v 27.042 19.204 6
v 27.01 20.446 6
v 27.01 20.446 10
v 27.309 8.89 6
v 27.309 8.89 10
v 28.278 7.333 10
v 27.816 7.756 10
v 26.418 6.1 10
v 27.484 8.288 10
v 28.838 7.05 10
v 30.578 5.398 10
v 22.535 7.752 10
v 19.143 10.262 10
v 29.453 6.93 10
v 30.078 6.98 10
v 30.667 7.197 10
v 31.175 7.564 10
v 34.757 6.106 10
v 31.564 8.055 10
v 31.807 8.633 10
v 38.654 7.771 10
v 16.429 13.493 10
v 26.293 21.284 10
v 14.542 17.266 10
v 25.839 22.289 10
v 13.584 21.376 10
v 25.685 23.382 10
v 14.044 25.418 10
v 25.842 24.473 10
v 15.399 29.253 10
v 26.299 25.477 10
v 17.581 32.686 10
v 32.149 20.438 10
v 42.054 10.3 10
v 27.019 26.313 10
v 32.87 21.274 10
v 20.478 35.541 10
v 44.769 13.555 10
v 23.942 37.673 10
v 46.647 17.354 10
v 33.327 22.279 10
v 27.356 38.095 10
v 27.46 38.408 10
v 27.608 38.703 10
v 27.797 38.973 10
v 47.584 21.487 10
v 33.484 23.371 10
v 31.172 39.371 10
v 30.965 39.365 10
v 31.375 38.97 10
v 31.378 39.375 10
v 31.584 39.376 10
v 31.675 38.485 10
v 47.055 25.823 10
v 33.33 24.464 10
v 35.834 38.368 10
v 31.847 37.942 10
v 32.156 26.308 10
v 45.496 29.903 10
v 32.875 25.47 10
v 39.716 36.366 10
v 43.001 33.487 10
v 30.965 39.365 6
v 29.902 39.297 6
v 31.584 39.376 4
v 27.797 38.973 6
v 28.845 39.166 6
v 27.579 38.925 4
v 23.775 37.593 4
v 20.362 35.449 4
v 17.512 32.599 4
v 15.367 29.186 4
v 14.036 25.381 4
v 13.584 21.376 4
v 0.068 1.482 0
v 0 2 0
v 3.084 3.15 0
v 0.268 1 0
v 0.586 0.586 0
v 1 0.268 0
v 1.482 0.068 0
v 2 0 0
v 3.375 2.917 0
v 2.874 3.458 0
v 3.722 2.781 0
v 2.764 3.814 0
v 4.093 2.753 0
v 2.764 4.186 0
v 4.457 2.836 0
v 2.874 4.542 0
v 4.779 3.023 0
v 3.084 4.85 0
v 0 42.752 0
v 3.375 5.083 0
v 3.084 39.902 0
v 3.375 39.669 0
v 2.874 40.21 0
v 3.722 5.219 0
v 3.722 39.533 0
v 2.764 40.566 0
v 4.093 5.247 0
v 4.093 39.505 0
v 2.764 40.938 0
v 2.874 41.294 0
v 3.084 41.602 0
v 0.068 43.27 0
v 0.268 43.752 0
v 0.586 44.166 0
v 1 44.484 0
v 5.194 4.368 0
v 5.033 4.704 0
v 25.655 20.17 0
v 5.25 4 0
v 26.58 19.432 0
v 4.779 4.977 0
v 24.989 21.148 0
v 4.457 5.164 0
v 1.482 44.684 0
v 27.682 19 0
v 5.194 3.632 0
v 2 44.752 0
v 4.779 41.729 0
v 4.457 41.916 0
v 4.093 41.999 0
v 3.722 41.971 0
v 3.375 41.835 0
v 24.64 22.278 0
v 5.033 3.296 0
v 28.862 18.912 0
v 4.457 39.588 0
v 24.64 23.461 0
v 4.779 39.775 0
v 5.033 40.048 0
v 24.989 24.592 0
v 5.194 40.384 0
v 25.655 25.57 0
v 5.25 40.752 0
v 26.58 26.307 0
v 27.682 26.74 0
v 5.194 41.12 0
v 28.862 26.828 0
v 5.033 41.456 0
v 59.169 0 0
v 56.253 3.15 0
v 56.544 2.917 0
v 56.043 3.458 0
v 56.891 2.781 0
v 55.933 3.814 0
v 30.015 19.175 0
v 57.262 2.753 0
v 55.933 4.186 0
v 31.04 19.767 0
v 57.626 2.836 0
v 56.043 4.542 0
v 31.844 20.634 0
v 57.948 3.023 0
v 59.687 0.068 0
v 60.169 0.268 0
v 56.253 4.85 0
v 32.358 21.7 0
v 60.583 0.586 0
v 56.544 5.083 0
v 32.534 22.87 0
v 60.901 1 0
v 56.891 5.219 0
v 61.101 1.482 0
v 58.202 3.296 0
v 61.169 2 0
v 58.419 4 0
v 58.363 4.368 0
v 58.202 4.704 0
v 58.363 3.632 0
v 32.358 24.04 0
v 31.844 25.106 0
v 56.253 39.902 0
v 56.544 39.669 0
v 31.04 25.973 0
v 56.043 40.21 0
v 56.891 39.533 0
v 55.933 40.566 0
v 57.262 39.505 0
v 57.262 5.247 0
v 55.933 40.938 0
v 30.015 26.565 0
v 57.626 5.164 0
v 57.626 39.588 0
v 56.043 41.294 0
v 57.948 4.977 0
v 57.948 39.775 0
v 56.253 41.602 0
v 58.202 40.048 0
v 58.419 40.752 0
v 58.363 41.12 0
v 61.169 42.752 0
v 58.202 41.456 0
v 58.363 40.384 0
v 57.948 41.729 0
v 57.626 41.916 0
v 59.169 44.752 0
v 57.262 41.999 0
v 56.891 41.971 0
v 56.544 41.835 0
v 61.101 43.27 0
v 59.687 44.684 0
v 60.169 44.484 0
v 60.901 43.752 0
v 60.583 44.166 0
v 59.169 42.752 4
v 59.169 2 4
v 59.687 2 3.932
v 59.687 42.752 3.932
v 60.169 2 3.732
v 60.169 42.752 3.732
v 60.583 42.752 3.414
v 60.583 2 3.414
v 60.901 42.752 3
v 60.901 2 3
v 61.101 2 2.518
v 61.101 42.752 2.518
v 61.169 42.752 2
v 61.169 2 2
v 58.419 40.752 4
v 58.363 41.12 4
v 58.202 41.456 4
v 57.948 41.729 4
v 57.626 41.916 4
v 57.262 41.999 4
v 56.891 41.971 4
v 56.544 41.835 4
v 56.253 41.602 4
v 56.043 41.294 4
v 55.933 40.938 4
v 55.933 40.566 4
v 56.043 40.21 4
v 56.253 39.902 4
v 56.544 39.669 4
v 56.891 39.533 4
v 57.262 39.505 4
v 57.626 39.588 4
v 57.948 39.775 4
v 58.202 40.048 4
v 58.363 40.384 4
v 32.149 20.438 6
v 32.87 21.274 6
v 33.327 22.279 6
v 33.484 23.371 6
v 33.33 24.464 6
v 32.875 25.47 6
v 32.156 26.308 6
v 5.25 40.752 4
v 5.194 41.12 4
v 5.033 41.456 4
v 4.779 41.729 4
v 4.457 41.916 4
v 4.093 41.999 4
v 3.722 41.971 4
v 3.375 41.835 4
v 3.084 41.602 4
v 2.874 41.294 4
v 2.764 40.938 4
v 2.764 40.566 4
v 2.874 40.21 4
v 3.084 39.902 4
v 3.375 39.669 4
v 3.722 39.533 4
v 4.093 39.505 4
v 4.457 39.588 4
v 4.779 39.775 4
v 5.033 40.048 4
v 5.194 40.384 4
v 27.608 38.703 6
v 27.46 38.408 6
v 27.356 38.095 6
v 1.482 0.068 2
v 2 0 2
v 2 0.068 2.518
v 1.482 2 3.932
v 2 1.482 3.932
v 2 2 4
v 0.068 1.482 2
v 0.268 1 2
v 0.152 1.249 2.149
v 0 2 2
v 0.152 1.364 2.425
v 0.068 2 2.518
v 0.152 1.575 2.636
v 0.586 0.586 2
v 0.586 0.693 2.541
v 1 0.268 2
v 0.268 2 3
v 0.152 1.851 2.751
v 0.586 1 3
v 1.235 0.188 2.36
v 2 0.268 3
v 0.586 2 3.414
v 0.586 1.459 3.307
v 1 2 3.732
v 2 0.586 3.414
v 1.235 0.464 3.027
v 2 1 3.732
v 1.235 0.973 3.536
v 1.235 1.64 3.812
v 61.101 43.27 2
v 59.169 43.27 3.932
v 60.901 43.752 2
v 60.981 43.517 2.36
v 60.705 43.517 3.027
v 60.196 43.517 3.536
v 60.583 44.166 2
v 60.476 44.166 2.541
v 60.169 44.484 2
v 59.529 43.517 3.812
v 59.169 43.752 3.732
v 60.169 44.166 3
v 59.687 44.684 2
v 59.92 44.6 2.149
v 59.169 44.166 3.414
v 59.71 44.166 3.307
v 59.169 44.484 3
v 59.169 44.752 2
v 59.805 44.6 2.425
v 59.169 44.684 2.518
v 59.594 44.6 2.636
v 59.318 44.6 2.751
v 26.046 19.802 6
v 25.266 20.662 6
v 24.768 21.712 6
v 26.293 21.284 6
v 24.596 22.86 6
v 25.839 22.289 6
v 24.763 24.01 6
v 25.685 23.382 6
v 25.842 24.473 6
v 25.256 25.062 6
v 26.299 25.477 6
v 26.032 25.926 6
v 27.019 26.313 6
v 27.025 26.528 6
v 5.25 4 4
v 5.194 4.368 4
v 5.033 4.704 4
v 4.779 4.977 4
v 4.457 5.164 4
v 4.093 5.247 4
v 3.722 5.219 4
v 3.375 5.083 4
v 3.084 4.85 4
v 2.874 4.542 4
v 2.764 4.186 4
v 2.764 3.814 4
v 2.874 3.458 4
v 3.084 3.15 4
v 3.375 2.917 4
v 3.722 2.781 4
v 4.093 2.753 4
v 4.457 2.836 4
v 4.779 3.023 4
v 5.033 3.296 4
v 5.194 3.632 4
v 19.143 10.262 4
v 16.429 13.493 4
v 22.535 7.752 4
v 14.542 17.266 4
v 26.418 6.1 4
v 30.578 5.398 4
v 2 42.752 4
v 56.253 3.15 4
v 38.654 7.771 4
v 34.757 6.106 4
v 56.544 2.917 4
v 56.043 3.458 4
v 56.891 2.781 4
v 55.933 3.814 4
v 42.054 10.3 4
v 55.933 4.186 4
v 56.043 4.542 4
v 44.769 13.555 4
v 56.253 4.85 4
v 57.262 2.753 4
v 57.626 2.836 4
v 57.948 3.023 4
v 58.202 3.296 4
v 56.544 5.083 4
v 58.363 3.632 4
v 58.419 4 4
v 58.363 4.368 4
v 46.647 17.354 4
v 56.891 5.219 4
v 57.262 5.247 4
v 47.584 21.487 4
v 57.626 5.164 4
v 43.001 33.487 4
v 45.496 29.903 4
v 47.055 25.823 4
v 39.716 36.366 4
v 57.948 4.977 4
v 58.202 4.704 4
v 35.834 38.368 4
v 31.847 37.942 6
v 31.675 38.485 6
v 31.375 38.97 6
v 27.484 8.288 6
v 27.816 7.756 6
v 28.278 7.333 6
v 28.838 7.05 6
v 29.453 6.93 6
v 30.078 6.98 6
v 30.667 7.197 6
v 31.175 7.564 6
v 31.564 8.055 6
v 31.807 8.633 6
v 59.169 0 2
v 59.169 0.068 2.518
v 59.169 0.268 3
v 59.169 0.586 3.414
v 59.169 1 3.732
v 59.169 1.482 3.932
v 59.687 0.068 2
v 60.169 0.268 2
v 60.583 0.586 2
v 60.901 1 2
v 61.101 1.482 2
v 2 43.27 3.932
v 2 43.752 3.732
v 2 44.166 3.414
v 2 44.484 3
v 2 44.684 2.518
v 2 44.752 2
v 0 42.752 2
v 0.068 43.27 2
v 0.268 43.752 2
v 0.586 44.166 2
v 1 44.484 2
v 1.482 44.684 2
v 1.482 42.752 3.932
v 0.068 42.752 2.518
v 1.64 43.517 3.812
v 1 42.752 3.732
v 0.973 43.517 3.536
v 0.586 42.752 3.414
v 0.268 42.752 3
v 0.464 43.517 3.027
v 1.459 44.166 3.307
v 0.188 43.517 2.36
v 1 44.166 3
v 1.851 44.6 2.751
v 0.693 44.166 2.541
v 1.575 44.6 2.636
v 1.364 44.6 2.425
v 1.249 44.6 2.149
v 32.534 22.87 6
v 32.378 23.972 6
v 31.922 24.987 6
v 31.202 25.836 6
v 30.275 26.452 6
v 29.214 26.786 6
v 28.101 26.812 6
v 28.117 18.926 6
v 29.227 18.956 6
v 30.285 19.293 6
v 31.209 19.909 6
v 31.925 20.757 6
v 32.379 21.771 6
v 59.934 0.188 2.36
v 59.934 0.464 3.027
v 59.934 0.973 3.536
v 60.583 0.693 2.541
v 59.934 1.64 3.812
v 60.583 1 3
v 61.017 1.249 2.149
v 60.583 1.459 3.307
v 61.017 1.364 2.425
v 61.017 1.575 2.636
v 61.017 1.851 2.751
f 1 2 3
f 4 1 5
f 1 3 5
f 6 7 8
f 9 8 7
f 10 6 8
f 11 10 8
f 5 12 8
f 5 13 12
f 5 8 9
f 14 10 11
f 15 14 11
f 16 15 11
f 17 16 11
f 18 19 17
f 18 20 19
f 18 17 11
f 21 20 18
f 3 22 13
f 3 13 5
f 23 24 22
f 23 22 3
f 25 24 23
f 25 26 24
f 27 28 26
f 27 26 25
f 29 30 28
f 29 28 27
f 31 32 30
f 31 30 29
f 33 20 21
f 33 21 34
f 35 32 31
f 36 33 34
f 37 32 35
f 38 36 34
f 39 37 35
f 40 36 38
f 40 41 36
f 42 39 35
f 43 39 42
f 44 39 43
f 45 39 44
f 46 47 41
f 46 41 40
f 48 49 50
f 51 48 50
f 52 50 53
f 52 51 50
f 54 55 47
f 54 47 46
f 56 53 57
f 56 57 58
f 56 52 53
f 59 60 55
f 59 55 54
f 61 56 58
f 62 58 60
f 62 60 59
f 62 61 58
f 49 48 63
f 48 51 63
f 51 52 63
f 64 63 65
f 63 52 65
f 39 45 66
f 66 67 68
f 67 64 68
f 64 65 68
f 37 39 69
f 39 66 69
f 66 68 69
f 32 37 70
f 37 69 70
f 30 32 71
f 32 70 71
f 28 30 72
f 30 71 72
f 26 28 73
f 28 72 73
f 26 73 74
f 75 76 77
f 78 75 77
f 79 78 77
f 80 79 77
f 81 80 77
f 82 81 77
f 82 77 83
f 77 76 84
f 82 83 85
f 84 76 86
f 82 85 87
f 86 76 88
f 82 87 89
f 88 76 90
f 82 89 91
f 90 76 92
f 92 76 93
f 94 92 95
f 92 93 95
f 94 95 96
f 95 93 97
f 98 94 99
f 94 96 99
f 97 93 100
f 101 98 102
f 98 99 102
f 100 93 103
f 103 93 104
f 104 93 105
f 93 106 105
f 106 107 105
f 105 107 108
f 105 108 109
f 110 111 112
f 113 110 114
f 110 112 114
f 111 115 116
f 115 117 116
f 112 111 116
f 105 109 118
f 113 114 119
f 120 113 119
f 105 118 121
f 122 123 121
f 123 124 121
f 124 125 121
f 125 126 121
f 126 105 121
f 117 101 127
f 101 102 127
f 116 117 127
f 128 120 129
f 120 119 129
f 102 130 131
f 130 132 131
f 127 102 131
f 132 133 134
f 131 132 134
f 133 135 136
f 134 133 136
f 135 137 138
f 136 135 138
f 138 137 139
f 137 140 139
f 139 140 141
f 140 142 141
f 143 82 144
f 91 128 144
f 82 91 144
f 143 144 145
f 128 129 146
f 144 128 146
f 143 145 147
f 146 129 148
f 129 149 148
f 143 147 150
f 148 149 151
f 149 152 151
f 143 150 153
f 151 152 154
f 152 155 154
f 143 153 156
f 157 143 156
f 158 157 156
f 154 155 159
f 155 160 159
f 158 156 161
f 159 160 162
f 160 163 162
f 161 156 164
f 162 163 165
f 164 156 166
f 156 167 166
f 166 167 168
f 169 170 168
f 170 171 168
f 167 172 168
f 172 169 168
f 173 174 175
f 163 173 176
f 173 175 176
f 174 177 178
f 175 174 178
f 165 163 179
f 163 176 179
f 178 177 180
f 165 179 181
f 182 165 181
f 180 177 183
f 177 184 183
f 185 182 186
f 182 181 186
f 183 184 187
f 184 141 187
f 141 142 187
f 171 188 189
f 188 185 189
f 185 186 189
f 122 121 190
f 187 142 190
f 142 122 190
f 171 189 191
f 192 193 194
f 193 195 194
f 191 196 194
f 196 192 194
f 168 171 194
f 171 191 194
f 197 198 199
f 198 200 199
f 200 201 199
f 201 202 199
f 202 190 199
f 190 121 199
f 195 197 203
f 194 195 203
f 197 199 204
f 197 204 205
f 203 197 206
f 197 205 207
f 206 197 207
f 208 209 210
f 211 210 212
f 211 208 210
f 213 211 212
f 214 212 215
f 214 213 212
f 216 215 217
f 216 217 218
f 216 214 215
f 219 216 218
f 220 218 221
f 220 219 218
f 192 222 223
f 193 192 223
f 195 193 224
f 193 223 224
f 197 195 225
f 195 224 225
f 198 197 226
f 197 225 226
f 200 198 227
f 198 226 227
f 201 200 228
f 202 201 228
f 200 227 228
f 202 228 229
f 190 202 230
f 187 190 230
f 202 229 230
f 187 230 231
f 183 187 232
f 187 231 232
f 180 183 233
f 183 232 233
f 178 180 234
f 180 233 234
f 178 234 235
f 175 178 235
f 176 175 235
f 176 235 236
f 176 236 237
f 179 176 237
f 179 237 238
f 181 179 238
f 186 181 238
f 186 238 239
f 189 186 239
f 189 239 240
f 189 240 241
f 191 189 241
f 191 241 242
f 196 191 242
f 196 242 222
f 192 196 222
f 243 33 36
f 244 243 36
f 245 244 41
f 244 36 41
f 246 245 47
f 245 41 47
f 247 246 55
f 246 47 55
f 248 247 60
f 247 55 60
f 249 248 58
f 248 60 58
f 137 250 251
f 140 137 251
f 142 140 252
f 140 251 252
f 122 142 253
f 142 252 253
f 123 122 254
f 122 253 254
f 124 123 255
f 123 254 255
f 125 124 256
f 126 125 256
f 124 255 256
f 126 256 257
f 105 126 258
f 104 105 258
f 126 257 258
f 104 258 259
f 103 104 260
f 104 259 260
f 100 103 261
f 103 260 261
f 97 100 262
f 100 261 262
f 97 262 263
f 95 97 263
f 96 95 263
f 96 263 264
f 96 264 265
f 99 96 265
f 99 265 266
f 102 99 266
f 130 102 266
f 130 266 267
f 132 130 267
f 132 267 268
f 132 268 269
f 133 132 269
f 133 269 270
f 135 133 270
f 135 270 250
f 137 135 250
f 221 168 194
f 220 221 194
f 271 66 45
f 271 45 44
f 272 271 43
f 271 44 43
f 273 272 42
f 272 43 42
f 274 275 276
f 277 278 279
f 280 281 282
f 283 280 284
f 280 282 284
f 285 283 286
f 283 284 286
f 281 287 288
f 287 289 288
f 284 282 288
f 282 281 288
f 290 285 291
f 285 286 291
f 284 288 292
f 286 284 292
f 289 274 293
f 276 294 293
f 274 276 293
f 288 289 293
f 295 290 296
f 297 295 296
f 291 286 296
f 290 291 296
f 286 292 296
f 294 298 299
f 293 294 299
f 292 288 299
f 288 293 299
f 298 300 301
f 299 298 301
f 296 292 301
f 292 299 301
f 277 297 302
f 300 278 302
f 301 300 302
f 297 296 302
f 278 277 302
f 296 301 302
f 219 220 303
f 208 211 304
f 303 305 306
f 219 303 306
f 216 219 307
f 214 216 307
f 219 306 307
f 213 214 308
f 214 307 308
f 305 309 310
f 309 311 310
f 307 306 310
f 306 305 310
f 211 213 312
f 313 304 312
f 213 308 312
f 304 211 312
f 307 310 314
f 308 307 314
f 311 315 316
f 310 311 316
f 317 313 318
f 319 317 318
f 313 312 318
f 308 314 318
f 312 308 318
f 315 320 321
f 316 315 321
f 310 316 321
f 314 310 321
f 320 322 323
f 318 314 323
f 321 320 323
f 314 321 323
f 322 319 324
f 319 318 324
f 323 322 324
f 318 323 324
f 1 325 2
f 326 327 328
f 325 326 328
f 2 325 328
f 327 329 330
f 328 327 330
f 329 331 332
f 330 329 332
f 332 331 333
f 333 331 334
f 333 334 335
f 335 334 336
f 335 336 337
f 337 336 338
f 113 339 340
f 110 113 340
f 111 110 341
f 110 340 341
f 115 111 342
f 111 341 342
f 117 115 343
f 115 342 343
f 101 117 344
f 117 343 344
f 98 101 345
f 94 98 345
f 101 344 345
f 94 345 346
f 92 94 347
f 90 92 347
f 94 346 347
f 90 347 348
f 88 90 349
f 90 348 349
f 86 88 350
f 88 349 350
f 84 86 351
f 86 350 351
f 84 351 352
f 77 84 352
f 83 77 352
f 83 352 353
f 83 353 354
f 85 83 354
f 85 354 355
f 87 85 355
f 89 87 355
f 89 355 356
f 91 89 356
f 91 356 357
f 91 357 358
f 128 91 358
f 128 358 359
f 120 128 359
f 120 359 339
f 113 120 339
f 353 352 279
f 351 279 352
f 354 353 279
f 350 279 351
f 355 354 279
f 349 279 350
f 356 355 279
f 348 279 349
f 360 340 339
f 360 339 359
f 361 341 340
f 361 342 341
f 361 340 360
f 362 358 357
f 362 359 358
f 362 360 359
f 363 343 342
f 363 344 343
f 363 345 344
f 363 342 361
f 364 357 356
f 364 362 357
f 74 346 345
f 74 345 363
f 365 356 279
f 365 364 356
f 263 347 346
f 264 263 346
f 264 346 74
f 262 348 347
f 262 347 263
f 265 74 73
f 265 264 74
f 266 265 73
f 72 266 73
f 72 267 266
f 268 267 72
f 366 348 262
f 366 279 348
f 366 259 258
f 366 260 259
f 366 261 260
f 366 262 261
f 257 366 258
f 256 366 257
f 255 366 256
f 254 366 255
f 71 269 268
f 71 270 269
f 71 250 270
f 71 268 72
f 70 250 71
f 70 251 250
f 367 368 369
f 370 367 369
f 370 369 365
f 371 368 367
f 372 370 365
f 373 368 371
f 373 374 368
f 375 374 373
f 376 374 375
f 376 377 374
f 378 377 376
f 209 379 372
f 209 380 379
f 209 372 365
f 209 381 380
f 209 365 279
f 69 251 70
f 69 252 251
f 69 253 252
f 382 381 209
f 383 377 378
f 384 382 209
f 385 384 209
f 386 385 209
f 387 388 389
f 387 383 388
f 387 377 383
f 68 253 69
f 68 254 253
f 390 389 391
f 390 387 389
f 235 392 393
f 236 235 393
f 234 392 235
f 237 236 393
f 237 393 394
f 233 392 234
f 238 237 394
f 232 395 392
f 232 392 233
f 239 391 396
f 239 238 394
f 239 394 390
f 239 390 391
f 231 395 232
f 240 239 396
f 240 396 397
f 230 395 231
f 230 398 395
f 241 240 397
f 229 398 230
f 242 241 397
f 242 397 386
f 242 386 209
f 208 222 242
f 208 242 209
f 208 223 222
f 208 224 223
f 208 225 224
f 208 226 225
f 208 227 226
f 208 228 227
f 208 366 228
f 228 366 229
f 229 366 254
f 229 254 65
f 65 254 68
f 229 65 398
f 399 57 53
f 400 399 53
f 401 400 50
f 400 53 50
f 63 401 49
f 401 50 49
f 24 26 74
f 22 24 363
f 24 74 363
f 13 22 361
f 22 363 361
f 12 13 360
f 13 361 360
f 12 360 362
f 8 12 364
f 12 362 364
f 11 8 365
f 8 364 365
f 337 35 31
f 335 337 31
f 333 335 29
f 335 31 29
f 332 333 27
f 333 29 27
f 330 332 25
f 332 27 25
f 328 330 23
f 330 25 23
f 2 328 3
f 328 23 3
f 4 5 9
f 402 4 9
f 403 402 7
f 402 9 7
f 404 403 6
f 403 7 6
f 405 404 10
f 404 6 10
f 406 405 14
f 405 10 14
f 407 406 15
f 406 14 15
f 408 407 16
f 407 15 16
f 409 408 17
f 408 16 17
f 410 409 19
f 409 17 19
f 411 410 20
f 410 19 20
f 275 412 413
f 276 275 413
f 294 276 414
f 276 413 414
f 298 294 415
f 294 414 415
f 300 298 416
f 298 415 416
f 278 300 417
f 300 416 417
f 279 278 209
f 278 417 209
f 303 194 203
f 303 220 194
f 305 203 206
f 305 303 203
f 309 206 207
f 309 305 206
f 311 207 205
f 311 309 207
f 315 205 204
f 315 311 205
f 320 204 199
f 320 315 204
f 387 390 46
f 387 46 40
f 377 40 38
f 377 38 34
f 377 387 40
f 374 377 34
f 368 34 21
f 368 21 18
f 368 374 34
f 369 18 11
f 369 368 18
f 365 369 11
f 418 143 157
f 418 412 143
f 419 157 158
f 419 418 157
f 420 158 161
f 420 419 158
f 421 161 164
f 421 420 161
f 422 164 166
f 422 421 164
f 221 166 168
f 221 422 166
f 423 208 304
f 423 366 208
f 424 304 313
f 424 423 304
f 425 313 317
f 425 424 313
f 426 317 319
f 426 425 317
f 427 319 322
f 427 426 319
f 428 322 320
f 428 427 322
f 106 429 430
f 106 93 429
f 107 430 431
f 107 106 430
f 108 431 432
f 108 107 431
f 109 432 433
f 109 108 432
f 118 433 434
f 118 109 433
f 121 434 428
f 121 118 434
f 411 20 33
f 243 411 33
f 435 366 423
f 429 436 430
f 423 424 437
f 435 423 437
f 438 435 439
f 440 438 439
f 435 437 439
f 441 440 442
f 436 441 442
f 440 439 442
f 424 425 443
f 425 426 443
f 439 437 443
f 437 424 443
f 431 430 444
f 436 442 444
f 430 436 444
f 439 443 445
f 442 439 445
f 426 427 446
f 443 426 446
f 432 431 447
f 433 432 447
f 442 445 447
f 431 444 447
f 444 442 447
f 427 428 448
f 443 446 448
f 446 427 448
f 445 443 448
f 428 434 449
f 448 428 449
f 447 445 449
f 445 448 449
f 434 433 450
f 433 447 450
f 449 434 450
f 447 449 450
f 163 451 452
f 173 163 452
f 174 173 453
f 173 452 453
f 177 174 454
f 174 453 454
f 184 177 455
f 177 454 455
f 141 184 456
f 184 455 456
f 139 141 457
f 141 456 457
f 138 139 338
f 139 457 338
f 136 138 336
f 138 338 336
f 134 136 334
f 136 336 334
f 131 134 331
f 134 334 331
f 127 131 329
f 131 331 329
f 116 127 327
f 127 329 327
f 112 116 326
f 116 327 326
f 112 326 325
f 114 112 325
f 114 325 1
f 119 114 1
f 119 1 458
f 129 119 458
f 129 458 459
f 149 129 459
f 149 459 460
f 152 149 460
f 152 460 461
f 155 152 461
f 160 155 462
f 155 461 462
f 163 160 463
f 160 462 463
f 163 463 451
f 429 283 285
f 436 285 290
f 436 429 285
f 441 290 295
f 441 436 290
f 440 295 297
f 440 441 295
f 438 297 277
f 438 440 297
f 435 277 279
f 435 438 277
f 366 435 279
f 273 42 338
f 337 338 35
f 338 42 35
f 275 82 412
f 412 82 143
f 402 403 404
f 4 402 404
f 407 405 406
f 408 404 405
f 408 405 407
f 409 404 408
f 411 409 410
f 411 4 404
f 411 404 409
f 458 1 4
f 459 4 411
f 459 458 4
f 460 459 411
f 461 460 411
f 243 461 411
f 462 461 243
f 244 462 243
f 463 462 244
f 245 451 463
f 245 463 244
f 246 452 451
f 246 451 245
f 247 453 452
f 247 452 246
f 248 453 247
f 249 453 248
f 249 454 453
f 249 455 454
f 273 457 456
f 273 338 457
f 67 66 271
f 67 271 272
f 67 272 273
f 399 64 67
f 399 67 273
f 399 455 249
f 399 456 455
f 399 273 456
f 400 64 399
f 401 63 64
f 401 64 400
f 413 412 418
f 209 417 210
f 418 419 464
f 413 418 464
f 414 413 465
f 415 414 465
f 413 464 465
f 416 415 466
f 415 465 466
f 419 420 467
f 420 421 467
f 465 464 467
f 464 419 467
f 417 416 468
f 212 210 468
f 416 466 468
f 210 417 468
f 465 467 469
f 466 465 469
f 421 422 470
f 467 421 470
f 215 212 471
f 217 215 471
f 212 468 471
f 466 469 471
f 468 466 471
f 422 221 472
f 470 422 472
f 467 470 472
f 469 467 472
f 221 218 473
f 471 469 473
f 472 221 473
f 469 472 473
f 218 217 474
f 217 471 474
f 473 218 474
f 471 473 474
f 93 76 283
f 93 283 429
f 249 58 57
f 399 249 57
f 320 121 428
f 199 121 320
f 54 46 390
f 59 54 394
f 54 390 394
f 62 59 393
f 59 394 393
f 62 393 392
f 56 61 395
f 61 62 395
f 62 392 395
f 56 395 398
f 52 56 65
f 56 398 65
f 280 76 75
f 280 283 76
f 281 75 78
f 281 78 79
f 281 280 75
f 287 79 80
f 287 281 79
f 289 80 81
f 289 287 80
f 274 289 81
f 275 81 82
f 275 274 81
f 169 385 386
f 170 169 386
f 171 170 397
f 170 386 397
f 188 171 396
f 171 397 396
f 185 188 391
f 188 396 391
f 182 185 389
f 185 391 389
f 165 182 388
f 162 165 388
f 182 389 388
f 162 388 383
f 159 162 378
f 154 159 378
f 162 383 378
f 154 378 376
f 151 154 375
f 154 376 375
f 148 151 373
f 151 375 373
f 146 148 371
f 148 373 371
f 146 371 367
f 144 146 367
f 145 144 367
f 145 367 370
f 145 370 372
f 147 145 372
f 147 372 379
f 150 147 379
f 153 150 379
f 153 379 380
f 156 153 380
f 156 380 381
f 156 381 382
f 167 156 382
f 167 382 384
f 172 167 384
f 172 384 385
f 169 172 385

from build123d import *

# Parameters (mm, degrees)
SKETCH1_W           = 61.169
SKETCH1_H           = 44.752
BOSS_EXTRUDE1_DEPTH = 4
SKETCH2_W           = 34
SKETCH2_H           = 34
BOSS_EXTRUDE2_DEPTH = 6
CUT_EXTRUDE1_DEPTH  = 4
SKETCH4_R           = 3.969265512
CUT_EXTRUDE2_DEPTH  = 77.028863368
FILLET1_R           = 18
FILLET2_R           = 18
FILLET3_R           = 18
FILLET4_START       = 4
FILLET4_DEPTH       = 6
SKETCH5_R           = 1.25
CUT_EXTRUDE3_DEPTH  = 77.028863368
FILLET5_R           = 2
FILLET6_R           = 2
FILLET7_R           = 2
FILLET8_R           = 2


with BuildPart() as part:
    # Sketch1 → Boss-Extrude1 (new body)
    with BuildSketch(Plane.XY):
        with Locations((30.5845, 22.376)):
            Rectangle(SKETCH1_W, SKETCH1_H)
    extrude(amount=BOSS_EXTRUDE1_DEPTH)

    # Sketch2 → Boss-Extrude2 (add)
    with BuildSketch(Plane.XY.offset(4)):
        with Locations((30.5845, 22.376)):
            Rectangle(SKETCH2_W, SKETCH2_H)
    extrude(amount=BOSS_EXTRUDE2_DEPTH)

    # Sketch3 → Cut-Extrude1 (cut)
    with BuildSketch(Plane.XY.offset(10)):
        with BuildLine():
            Line((27.356049636, 38.095217862), (27.01861523, 26.313045343))
            ThreePointArc((27.01861523, 26.313045343), (25.684503943, 23.381545743), (27.010272743, 20.446263829))
            Line((27.010272743, 20.446263829), (27.309152271, 8.890153737))
            ThreePointArc((27.309152271, 8.890153737), (29.453459694, 6.929735982), (31.806869101, 8.633483691))
            Line((31.806869101, 8.633483691), (32.149278144, 20.437988245))
            ThreePointArc((32.149278144, 20.437988245), (33.484497114, 23.371255165), (32.156419459, 26.307762319))
            Line((32.156419459, 26.307762319), (31.846569585, 37.941982205))
            ThreePointArc((31.846569585, 37.941982205), (29.662940134, 39.824662034), (27.356049636, 38.095217862))
        make_face()
    extrude(amount=-CUT_EXTRUDE1_DEPTH, mode=Mode.SUBTRACT)

    # Sketch4 → Cut-Extrude2 (cut, through all)
    with BuildSketch(Plane.XY.offset(6)):
        with Locations((28.564891977, 22.86990875)):
            Circle(SKETCH4_R)
    extrude(amount=-CUT_EXTRUDE2_DEPTH, mode=Mode.SUBTRACT)

    # Fillet1
    # the kernel refuses this fillet: 18 mm, written as the material it takes off along each edge
    with BuildSketch(Plane(origin=(13.5845, 39.376, 4), x_dir=(0, -1, 0), z_dir=(0, 0, 1))) as fillet1_piece_1:
        with BuildLine():
            CenterArc((FILLET1_R, FILLET1_R), FILLET1_R, 180, 90)
            Line((0, FILLET1_R), (0, 0))
            Line((0, 0), (FILLET1_R, 0))
        make_face()
    extrude(amount=51, mode=Mode.SUBTRACT)

    # Fillet2
    # the kernel refuses this fillet: 18 mm, written as the material it takes off along each edge
    with BuildSketch(Plane(origin=(47.5845, 39.376, 4), x_dir=(0, -1, 0), z_dir=(0, 0, 1))) as fillet2_piece_1:
        with BuildLine():
            CenterArc((17.88854382, -18), FILLET2_R, 90, 83.620629792)
            Line((0, -16), (0, 0))
            Line((0, 0), (17.88854382, 0))
        make_face()
    extrude(amount=50.72135955, mode=Mode.SUBTRACT)

    # Fillet3
    # the kernel refuses this fillet: 18 mm, written as the material it takes off along each edge
    with BuildSketch(Plane(origin=(13.5845, 5.376, 4), x_dir=(0, 1, 0), z_dir=(0, 0, 1))) as fillet3_piece_1:
        with BuildLine():
            CenterArc((18, -17.88854382), FILLET3_R, 96.379370208, 83.620629792)
            Line((0, -17.88854382), (0, 0))
            Line((0, 0), (16, 0))
        make_face()
    extrude(amount=50.72135955, mode=Mode.SUBTRACT)

    # Fillet4: read off the stored shape, not the designer's step
    # Fillet4 outline → Fillet4 (cut)
    with BuildSketch(Plane.XY.offset(FILLET4_START)):
        with BuildLine():
            ThreePointArc((47.5845, 21.48745618), (42.054418725, 10.300490896), (30.578445069, 5.398244493))
            ThreePointArc((30.578445069, 5.398244493), (31.025606187, 5.381561983), (31.47304382, 5.376))
            Line((31.47304382, 5.376), (47.5845, 5.376))
            Line((47.5845, 5.376), (47.5845, 21.48745618))
        make_face()
    extrude(amount=FILLET4_DEPTH, mode=Mode.SUBTRACT)

    # Sketch5 → Cut-Extrude3 (cut, through all)
    with BuildSketch(Plane.XY.offset(4)):
        with Locations((4, 40.752)):
            Circle(SKETCH5_R)
        with Locations((57.169, 40.752)):
            Circle(SKETCH5_R)
        with Locations((4, 4)):
            Circle(SKETCH5_R)
        with Locations((57.169, 4)):
            Circle(SKETCH5_R)
    extrude(amount=-CUT_EXTRUDE3_DEPTH, mode=Mode.SUBTRACT)

    # Fillet5
    fillet5_edges = [part.edges().sort_by_distance(p)[0] for p in [
        (30.5845, 0, 4),
    ]]
    fillet(fillet5_edges, radius=FILLET5_R)

    # Fillet6
    fillet6_edges = [part.edges().sort_by_distance(p)[0] for p in [
        (61.169, 23.376, 4),
        (61.169, 0, 1),
        (61.169, 0.585786438, 3.414213562),
    ]]
    fillet(fillet6_edges, radius=FILLET6_R)

    # Fillet7
    fillet7_edges = [part.edges().sort_by_distance(p)[0] for p in [
        (0, 23.376, 4),
        (0, 0, 1),
        (0, 0.585786438, 3.414213562),
    ]]
    fillet(fillet7_edges, radius=FILLET7_R)

    # Fillet8
    fillet8_edges = [part.edges().sort_by_distance(p)[0] for p in [
        (61.169, 44.752, 1),
        (60.583213562, 44.752, 3.414213562),
        (0, 44.752, 1),
        (30.5845, 44.752, 4),
        (0.585786438, 44.752, 3.414213562),
    ]]
    fillet(fillet8_edges, radius=FILLET8_R)


solid = part.part
